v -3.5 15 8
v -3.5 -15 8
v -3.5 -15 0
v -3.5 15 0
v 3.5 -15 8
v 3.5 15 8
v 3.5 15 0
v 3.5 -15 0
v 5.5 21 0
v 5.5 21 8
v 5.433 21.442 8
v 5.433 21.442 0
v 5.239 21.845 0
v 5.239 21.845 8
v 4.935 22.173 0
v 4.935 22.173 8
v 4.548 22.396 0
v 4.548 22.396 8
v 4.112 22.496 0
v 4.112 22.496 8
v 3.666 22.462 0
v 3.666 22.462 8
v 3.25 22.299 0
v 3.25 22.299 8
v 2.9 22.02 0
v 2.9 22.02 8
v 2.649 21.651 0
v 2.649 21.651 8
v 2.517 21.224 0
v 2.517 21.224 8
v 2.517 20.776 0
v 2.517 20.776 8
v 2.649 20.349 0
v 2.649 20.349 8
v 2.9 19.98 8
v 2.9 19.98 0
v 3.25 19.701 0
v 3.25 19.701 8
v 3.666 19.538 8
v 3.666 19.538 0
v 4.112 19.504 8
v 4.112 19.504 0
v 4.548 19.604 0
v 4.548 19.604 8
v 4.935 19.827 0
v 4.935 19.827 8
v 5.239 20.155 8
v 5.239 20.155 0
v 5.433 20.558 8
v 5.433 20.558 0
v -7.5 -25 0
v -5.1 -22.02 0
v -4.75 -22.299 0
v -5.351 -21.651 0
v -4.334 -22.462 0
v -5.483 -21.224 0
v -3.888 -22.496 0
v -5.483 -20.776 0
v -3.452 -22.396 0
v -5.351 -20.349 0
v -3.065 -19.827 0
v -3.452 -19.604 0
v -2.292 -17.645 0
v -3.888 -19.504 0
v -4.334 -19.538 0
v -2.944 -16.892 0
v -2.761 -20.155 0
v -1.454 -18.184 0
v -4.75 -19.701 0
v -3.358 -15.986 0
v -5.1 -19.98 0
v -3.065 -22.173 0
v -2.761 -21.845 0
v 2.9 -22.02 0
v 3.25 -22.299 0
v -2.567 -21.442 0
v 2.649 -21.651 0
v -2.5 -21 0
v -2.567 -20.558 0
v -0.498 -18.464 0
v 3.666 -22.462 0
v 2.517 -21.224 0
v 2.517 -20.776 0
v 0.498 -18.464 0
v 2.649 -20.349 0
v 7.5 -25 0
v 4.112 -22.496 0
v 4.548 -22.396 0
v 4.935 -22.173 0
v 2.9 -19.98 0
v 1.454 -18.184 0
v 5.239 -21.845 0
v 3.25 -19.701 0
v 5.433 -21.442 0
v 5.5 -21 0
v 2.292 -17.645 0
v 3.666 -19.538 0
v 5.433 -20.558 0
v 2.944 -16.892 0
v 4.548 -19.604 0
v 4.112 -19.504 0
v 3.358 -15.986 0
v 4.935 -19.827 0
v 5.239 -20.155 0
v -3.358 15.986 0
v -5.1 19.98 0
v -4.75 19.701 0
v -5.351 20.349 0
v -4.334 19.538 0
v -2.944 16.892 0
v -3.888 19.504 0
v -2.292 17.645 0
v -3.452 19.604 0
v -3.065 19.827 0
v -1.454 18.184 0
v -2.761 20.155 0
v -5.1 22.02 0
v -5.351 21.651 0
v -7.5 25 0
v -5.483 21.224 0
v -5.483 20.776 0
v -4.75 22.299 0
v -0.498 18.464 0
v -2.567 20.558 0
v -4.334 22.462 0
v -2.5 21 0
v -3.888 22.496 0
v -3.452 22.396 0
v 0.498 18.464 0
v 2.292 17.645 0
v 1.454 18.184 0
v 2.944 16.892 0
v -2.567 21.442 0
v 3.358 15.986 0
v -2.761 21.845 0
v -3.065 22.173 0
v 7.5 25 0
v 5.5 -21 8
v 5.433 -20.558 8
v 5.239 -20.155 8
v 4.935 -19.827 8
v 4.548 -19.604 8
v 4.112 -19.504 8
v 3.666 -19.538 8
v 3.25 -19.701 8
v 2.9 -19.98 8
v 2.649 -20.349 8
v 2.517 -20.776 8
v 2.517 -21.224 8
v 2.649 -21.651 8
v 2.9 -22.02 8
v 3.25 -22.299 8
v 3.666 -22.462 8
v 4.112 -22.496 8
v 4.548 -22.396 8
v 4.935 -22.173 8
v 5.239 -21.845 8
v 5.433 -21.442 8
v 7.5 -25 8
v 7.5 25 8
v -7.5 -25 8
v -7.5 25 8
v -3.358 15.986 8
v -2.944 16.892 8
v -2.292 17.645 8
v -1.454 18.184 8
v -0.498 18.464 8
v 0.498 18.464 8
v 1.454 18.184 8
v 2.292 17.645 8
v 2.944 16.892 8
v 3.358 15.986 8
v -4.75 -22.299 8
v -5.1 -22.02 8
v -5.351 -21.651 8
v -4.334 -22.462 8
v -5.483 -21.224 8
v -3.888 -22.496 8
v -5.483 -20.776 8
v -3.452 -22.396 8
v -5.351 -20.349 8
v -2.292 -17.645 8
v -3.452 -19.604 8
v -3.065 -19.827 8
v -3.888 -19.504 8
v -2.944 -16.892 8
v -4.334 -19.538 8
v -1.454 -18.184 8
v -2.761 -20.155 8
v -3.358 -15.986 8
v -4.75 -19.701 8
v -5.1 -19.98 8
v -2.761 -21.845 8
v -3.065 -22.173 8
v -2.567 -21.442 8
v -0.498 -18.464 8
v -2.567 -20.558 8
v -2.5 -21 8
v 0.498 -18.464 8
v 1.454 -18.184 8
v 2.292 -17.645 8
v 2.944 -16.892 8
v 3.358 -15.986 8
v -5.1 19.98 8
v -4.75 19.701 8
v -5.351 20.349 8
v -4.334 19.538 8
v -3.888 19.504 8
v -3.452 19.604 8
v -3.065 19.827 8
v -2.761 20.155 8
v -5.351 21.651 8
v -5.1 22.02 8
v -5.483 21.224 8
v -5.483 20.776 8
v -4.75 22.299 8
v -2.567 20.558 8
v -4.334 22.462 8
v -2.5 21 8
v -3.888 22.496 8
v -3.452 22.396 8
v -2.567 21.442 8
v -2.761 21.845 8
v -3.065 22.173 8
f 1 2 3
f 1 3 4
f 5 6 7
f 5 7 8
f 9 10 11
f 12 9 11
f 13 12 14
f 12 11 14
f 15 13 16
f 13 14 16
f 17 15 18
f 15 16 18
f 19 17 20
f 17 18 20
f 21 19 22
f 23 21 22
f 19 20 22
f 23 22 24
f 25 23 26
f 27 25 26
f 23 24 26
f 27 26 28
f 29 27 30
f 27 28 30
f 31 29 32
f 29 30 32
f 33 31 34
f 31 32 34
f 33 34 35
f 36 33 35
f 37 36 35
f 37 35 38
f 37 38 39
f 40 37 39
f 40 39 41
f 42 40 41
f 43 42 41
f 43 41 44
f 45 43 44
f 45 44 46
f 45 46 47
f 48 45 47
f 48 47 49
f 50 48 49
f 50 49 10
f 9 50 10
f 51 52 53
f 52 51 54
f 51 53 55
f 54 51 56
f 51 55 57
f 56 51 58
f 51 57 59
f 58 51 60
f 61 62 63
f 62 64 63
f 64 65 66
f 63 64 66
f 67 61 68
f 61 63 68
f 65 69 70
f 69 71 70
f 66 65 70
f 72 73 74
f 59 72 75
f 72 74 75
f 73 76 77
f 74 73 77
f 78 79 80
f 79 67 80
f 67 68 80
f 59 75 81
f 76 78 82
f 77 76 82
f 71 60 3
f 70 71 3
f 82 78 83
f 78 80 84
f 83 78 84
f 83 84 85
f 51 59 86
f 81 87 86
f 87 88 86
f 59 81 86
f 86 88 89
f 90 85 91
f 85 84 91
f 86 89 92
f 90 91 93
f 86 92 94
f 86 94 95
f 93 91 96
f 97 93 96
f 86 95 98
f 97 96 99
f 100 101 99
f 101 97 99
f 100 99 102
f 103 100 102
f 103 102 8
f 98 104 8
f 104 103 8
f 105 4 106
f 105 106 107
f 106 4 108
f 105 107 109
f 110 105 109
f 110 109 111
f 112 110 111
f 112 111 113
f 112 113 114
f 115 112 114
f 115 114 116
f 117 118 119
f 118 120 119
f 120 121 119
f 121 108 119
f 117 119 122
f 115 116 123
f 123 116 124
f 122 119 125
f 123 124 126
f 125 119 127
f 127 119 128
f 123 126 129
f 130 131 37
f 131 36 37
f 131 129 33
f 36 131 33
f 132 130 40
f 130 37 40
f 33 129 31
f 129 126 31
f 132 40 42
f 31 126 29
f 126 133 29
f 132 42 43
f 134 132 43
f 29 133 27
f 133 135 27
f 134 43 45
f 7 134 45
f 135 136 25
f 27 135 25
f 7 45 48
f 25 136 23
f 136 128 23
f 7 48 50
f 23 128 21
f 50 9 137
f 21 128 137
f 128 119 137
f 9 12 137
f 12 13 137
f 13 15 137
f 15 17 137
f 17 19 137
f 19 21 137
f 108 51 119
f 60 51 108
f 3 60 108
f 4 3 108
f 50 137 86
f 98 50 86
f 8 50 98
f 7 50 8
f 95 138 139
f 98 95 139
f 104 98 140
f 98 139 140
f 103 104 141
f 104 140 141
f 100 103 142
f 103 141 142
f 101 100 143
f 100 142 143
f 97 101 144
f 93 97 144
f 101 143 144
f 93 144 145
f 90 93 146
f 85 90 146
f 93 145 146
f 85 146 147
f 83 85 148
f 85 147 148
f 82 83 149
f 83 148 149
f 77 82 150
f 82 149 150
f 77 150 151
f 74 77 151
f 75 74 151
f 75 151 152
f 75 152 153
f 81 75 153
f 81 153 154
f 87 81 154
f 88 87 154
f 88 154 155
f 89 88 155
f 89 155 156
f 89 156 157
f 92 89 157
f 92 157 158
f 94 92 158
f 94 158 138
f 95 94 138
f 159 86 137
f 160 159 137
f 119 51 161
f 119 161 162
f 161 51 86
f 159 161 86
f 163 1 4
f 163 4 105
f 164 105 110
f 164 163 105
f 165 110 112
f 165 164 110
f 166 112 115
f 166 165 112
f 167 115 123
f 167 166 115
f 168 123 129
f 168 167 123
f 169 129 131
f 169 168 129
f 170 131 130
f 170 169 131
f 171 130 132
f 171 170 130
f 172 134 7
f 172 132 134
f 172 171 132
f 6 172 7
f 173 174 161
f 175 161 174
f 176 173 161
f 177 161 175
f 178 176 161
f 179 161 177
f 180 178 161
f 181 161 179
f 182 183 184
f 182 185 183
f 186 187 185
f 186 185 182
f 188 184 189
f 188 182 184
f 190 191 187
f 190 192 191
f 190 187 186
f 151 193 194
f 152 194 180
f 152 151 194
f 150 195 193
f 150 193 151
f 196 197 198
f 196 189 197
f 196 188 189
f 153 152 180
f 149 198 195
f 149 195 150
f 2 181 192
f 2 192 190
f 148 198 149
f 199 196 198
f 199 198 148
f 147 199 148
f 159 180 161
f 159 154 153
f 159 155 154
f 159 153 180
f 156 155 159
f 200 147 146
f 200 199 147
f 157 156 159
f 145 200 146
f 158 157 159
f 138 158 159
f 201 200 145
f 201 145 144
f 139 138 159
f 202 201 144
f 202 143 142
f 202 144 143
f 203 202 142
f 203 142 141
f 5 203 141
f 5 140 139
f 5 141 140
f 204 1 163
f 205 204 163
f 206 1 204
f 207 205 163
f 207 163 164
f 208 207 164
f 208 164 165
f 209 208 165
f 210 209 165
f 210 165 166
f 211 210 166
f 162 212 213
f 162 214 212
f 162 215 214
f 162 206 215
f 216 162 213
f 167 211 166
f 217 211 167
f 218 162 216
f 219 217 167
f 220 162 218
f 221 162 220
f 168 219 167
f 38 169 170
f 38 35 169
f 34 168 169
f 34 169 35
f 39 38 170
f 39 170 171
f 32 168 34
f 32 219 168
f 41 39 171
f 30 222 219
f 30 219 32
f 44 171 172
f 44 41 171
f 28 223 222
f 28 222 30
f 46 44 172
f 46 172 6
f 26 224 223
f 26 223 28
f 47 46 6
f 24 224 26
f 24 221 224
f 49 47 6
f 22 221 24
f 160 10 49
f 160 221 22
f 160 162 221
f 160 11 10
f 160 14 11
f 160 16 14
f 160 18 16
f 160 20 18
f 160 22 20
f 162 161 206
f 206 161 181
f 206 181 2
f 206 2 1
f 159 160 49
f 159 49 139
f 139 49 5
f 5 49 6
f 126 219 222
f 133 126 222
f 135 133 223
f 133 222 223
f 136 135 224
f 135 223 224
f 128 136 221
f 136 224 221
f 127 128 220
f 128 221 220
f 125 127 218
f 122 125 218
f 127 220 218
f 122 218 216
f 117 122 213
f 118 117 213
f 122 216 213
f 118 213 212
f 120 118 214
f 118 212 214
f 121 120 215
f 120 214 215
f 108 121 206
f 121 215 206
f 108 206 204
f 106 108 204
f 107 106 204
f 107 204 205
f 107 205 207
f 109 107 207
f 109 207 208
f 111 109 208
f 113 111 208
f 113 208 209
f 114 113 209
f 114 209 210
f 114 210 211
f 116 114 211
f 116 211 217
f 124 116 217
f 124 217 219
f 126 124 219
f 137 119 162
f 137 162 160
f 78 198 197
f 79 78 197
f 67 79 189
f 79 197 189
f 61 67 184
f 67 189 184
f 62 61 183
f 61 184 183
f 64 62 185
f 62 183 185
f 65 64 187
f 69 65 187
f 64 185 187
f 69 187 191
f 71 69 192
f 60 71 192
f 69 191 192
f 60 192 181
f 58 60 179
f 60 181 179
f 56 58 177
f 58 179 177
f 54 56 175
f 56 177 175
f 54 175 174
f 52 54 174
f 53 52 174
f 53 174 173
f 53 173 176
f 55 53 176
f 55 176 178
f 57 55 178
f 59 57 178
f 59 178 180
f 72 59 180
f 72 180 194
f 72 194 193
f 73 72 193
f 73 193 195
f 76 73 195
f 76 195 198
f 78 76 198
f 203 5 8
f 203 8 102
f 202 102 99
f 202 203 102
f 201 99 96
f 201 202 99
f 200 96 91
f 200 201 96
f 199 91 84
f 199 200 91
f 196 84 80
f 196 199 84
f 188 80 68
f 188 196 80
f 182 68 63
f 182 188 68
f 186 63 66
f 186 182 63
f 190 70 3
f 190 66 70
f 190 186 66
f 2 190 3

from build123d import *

# Parameters (mm, degrees)
SKETCH_1_W          = 15
SKETCH_1_H          = 50
EXTRUDE_1_DEPTH     = 8
SKETCH_2_R          = 1.5
CUT_EXTRUDE_1_DEPTH = 28.299267389
CUT_EXTRUDE_3_DEPTH = 28.299267389


with BuildPart() as part:
    # 草图1 → 凸台-拉伸1 (new body)
    with BuildSketch(Plane.XY):
        Rectangle(SKETCH_1_W, SKETCH_1_H)
    extrude(amount=EXTRUDE_1_DEPTH)

    # 草图2 → 切除-拉伸1 (cut, through all)
    with BuildSketch(Plane.XY.offset(8)):
        with Locations((-4, 21)):
            Circle(SKETCH_2_R)
        with Locations((4, 21)):
            Circle(SKETCH_2_R)
        with Locations((4, -21)):
            Circle(SKETCH_2_R)
        with Locations((-4, -21)):
            Circle(SKETCH_2_R)
    extrude(amount=-CUT_EXTRUDE_1_DEPTH, mode=Mode.SUBTRACT)

    # 草图3 → 切除-拉伸3 (cut, through all)
    with BuildSketch(Plane.XY.offset(8)):
        with BuildLine():
            Line((3.5, 15), (3.5, -15))
            ThreePointArc((3.5, -15), (0, -18.5), (-3.5, -15))
            Line((-3.5, -15), (-3.5, 15))
            ThreePointArc((-3.5, 15), (0, 18.5), (3.5, 15))
        make_face()
    extrude(amount=-CUT_EXTRUDE_3_DEPTH, mode=Mode.SUBTRACT)


solid = part.part
